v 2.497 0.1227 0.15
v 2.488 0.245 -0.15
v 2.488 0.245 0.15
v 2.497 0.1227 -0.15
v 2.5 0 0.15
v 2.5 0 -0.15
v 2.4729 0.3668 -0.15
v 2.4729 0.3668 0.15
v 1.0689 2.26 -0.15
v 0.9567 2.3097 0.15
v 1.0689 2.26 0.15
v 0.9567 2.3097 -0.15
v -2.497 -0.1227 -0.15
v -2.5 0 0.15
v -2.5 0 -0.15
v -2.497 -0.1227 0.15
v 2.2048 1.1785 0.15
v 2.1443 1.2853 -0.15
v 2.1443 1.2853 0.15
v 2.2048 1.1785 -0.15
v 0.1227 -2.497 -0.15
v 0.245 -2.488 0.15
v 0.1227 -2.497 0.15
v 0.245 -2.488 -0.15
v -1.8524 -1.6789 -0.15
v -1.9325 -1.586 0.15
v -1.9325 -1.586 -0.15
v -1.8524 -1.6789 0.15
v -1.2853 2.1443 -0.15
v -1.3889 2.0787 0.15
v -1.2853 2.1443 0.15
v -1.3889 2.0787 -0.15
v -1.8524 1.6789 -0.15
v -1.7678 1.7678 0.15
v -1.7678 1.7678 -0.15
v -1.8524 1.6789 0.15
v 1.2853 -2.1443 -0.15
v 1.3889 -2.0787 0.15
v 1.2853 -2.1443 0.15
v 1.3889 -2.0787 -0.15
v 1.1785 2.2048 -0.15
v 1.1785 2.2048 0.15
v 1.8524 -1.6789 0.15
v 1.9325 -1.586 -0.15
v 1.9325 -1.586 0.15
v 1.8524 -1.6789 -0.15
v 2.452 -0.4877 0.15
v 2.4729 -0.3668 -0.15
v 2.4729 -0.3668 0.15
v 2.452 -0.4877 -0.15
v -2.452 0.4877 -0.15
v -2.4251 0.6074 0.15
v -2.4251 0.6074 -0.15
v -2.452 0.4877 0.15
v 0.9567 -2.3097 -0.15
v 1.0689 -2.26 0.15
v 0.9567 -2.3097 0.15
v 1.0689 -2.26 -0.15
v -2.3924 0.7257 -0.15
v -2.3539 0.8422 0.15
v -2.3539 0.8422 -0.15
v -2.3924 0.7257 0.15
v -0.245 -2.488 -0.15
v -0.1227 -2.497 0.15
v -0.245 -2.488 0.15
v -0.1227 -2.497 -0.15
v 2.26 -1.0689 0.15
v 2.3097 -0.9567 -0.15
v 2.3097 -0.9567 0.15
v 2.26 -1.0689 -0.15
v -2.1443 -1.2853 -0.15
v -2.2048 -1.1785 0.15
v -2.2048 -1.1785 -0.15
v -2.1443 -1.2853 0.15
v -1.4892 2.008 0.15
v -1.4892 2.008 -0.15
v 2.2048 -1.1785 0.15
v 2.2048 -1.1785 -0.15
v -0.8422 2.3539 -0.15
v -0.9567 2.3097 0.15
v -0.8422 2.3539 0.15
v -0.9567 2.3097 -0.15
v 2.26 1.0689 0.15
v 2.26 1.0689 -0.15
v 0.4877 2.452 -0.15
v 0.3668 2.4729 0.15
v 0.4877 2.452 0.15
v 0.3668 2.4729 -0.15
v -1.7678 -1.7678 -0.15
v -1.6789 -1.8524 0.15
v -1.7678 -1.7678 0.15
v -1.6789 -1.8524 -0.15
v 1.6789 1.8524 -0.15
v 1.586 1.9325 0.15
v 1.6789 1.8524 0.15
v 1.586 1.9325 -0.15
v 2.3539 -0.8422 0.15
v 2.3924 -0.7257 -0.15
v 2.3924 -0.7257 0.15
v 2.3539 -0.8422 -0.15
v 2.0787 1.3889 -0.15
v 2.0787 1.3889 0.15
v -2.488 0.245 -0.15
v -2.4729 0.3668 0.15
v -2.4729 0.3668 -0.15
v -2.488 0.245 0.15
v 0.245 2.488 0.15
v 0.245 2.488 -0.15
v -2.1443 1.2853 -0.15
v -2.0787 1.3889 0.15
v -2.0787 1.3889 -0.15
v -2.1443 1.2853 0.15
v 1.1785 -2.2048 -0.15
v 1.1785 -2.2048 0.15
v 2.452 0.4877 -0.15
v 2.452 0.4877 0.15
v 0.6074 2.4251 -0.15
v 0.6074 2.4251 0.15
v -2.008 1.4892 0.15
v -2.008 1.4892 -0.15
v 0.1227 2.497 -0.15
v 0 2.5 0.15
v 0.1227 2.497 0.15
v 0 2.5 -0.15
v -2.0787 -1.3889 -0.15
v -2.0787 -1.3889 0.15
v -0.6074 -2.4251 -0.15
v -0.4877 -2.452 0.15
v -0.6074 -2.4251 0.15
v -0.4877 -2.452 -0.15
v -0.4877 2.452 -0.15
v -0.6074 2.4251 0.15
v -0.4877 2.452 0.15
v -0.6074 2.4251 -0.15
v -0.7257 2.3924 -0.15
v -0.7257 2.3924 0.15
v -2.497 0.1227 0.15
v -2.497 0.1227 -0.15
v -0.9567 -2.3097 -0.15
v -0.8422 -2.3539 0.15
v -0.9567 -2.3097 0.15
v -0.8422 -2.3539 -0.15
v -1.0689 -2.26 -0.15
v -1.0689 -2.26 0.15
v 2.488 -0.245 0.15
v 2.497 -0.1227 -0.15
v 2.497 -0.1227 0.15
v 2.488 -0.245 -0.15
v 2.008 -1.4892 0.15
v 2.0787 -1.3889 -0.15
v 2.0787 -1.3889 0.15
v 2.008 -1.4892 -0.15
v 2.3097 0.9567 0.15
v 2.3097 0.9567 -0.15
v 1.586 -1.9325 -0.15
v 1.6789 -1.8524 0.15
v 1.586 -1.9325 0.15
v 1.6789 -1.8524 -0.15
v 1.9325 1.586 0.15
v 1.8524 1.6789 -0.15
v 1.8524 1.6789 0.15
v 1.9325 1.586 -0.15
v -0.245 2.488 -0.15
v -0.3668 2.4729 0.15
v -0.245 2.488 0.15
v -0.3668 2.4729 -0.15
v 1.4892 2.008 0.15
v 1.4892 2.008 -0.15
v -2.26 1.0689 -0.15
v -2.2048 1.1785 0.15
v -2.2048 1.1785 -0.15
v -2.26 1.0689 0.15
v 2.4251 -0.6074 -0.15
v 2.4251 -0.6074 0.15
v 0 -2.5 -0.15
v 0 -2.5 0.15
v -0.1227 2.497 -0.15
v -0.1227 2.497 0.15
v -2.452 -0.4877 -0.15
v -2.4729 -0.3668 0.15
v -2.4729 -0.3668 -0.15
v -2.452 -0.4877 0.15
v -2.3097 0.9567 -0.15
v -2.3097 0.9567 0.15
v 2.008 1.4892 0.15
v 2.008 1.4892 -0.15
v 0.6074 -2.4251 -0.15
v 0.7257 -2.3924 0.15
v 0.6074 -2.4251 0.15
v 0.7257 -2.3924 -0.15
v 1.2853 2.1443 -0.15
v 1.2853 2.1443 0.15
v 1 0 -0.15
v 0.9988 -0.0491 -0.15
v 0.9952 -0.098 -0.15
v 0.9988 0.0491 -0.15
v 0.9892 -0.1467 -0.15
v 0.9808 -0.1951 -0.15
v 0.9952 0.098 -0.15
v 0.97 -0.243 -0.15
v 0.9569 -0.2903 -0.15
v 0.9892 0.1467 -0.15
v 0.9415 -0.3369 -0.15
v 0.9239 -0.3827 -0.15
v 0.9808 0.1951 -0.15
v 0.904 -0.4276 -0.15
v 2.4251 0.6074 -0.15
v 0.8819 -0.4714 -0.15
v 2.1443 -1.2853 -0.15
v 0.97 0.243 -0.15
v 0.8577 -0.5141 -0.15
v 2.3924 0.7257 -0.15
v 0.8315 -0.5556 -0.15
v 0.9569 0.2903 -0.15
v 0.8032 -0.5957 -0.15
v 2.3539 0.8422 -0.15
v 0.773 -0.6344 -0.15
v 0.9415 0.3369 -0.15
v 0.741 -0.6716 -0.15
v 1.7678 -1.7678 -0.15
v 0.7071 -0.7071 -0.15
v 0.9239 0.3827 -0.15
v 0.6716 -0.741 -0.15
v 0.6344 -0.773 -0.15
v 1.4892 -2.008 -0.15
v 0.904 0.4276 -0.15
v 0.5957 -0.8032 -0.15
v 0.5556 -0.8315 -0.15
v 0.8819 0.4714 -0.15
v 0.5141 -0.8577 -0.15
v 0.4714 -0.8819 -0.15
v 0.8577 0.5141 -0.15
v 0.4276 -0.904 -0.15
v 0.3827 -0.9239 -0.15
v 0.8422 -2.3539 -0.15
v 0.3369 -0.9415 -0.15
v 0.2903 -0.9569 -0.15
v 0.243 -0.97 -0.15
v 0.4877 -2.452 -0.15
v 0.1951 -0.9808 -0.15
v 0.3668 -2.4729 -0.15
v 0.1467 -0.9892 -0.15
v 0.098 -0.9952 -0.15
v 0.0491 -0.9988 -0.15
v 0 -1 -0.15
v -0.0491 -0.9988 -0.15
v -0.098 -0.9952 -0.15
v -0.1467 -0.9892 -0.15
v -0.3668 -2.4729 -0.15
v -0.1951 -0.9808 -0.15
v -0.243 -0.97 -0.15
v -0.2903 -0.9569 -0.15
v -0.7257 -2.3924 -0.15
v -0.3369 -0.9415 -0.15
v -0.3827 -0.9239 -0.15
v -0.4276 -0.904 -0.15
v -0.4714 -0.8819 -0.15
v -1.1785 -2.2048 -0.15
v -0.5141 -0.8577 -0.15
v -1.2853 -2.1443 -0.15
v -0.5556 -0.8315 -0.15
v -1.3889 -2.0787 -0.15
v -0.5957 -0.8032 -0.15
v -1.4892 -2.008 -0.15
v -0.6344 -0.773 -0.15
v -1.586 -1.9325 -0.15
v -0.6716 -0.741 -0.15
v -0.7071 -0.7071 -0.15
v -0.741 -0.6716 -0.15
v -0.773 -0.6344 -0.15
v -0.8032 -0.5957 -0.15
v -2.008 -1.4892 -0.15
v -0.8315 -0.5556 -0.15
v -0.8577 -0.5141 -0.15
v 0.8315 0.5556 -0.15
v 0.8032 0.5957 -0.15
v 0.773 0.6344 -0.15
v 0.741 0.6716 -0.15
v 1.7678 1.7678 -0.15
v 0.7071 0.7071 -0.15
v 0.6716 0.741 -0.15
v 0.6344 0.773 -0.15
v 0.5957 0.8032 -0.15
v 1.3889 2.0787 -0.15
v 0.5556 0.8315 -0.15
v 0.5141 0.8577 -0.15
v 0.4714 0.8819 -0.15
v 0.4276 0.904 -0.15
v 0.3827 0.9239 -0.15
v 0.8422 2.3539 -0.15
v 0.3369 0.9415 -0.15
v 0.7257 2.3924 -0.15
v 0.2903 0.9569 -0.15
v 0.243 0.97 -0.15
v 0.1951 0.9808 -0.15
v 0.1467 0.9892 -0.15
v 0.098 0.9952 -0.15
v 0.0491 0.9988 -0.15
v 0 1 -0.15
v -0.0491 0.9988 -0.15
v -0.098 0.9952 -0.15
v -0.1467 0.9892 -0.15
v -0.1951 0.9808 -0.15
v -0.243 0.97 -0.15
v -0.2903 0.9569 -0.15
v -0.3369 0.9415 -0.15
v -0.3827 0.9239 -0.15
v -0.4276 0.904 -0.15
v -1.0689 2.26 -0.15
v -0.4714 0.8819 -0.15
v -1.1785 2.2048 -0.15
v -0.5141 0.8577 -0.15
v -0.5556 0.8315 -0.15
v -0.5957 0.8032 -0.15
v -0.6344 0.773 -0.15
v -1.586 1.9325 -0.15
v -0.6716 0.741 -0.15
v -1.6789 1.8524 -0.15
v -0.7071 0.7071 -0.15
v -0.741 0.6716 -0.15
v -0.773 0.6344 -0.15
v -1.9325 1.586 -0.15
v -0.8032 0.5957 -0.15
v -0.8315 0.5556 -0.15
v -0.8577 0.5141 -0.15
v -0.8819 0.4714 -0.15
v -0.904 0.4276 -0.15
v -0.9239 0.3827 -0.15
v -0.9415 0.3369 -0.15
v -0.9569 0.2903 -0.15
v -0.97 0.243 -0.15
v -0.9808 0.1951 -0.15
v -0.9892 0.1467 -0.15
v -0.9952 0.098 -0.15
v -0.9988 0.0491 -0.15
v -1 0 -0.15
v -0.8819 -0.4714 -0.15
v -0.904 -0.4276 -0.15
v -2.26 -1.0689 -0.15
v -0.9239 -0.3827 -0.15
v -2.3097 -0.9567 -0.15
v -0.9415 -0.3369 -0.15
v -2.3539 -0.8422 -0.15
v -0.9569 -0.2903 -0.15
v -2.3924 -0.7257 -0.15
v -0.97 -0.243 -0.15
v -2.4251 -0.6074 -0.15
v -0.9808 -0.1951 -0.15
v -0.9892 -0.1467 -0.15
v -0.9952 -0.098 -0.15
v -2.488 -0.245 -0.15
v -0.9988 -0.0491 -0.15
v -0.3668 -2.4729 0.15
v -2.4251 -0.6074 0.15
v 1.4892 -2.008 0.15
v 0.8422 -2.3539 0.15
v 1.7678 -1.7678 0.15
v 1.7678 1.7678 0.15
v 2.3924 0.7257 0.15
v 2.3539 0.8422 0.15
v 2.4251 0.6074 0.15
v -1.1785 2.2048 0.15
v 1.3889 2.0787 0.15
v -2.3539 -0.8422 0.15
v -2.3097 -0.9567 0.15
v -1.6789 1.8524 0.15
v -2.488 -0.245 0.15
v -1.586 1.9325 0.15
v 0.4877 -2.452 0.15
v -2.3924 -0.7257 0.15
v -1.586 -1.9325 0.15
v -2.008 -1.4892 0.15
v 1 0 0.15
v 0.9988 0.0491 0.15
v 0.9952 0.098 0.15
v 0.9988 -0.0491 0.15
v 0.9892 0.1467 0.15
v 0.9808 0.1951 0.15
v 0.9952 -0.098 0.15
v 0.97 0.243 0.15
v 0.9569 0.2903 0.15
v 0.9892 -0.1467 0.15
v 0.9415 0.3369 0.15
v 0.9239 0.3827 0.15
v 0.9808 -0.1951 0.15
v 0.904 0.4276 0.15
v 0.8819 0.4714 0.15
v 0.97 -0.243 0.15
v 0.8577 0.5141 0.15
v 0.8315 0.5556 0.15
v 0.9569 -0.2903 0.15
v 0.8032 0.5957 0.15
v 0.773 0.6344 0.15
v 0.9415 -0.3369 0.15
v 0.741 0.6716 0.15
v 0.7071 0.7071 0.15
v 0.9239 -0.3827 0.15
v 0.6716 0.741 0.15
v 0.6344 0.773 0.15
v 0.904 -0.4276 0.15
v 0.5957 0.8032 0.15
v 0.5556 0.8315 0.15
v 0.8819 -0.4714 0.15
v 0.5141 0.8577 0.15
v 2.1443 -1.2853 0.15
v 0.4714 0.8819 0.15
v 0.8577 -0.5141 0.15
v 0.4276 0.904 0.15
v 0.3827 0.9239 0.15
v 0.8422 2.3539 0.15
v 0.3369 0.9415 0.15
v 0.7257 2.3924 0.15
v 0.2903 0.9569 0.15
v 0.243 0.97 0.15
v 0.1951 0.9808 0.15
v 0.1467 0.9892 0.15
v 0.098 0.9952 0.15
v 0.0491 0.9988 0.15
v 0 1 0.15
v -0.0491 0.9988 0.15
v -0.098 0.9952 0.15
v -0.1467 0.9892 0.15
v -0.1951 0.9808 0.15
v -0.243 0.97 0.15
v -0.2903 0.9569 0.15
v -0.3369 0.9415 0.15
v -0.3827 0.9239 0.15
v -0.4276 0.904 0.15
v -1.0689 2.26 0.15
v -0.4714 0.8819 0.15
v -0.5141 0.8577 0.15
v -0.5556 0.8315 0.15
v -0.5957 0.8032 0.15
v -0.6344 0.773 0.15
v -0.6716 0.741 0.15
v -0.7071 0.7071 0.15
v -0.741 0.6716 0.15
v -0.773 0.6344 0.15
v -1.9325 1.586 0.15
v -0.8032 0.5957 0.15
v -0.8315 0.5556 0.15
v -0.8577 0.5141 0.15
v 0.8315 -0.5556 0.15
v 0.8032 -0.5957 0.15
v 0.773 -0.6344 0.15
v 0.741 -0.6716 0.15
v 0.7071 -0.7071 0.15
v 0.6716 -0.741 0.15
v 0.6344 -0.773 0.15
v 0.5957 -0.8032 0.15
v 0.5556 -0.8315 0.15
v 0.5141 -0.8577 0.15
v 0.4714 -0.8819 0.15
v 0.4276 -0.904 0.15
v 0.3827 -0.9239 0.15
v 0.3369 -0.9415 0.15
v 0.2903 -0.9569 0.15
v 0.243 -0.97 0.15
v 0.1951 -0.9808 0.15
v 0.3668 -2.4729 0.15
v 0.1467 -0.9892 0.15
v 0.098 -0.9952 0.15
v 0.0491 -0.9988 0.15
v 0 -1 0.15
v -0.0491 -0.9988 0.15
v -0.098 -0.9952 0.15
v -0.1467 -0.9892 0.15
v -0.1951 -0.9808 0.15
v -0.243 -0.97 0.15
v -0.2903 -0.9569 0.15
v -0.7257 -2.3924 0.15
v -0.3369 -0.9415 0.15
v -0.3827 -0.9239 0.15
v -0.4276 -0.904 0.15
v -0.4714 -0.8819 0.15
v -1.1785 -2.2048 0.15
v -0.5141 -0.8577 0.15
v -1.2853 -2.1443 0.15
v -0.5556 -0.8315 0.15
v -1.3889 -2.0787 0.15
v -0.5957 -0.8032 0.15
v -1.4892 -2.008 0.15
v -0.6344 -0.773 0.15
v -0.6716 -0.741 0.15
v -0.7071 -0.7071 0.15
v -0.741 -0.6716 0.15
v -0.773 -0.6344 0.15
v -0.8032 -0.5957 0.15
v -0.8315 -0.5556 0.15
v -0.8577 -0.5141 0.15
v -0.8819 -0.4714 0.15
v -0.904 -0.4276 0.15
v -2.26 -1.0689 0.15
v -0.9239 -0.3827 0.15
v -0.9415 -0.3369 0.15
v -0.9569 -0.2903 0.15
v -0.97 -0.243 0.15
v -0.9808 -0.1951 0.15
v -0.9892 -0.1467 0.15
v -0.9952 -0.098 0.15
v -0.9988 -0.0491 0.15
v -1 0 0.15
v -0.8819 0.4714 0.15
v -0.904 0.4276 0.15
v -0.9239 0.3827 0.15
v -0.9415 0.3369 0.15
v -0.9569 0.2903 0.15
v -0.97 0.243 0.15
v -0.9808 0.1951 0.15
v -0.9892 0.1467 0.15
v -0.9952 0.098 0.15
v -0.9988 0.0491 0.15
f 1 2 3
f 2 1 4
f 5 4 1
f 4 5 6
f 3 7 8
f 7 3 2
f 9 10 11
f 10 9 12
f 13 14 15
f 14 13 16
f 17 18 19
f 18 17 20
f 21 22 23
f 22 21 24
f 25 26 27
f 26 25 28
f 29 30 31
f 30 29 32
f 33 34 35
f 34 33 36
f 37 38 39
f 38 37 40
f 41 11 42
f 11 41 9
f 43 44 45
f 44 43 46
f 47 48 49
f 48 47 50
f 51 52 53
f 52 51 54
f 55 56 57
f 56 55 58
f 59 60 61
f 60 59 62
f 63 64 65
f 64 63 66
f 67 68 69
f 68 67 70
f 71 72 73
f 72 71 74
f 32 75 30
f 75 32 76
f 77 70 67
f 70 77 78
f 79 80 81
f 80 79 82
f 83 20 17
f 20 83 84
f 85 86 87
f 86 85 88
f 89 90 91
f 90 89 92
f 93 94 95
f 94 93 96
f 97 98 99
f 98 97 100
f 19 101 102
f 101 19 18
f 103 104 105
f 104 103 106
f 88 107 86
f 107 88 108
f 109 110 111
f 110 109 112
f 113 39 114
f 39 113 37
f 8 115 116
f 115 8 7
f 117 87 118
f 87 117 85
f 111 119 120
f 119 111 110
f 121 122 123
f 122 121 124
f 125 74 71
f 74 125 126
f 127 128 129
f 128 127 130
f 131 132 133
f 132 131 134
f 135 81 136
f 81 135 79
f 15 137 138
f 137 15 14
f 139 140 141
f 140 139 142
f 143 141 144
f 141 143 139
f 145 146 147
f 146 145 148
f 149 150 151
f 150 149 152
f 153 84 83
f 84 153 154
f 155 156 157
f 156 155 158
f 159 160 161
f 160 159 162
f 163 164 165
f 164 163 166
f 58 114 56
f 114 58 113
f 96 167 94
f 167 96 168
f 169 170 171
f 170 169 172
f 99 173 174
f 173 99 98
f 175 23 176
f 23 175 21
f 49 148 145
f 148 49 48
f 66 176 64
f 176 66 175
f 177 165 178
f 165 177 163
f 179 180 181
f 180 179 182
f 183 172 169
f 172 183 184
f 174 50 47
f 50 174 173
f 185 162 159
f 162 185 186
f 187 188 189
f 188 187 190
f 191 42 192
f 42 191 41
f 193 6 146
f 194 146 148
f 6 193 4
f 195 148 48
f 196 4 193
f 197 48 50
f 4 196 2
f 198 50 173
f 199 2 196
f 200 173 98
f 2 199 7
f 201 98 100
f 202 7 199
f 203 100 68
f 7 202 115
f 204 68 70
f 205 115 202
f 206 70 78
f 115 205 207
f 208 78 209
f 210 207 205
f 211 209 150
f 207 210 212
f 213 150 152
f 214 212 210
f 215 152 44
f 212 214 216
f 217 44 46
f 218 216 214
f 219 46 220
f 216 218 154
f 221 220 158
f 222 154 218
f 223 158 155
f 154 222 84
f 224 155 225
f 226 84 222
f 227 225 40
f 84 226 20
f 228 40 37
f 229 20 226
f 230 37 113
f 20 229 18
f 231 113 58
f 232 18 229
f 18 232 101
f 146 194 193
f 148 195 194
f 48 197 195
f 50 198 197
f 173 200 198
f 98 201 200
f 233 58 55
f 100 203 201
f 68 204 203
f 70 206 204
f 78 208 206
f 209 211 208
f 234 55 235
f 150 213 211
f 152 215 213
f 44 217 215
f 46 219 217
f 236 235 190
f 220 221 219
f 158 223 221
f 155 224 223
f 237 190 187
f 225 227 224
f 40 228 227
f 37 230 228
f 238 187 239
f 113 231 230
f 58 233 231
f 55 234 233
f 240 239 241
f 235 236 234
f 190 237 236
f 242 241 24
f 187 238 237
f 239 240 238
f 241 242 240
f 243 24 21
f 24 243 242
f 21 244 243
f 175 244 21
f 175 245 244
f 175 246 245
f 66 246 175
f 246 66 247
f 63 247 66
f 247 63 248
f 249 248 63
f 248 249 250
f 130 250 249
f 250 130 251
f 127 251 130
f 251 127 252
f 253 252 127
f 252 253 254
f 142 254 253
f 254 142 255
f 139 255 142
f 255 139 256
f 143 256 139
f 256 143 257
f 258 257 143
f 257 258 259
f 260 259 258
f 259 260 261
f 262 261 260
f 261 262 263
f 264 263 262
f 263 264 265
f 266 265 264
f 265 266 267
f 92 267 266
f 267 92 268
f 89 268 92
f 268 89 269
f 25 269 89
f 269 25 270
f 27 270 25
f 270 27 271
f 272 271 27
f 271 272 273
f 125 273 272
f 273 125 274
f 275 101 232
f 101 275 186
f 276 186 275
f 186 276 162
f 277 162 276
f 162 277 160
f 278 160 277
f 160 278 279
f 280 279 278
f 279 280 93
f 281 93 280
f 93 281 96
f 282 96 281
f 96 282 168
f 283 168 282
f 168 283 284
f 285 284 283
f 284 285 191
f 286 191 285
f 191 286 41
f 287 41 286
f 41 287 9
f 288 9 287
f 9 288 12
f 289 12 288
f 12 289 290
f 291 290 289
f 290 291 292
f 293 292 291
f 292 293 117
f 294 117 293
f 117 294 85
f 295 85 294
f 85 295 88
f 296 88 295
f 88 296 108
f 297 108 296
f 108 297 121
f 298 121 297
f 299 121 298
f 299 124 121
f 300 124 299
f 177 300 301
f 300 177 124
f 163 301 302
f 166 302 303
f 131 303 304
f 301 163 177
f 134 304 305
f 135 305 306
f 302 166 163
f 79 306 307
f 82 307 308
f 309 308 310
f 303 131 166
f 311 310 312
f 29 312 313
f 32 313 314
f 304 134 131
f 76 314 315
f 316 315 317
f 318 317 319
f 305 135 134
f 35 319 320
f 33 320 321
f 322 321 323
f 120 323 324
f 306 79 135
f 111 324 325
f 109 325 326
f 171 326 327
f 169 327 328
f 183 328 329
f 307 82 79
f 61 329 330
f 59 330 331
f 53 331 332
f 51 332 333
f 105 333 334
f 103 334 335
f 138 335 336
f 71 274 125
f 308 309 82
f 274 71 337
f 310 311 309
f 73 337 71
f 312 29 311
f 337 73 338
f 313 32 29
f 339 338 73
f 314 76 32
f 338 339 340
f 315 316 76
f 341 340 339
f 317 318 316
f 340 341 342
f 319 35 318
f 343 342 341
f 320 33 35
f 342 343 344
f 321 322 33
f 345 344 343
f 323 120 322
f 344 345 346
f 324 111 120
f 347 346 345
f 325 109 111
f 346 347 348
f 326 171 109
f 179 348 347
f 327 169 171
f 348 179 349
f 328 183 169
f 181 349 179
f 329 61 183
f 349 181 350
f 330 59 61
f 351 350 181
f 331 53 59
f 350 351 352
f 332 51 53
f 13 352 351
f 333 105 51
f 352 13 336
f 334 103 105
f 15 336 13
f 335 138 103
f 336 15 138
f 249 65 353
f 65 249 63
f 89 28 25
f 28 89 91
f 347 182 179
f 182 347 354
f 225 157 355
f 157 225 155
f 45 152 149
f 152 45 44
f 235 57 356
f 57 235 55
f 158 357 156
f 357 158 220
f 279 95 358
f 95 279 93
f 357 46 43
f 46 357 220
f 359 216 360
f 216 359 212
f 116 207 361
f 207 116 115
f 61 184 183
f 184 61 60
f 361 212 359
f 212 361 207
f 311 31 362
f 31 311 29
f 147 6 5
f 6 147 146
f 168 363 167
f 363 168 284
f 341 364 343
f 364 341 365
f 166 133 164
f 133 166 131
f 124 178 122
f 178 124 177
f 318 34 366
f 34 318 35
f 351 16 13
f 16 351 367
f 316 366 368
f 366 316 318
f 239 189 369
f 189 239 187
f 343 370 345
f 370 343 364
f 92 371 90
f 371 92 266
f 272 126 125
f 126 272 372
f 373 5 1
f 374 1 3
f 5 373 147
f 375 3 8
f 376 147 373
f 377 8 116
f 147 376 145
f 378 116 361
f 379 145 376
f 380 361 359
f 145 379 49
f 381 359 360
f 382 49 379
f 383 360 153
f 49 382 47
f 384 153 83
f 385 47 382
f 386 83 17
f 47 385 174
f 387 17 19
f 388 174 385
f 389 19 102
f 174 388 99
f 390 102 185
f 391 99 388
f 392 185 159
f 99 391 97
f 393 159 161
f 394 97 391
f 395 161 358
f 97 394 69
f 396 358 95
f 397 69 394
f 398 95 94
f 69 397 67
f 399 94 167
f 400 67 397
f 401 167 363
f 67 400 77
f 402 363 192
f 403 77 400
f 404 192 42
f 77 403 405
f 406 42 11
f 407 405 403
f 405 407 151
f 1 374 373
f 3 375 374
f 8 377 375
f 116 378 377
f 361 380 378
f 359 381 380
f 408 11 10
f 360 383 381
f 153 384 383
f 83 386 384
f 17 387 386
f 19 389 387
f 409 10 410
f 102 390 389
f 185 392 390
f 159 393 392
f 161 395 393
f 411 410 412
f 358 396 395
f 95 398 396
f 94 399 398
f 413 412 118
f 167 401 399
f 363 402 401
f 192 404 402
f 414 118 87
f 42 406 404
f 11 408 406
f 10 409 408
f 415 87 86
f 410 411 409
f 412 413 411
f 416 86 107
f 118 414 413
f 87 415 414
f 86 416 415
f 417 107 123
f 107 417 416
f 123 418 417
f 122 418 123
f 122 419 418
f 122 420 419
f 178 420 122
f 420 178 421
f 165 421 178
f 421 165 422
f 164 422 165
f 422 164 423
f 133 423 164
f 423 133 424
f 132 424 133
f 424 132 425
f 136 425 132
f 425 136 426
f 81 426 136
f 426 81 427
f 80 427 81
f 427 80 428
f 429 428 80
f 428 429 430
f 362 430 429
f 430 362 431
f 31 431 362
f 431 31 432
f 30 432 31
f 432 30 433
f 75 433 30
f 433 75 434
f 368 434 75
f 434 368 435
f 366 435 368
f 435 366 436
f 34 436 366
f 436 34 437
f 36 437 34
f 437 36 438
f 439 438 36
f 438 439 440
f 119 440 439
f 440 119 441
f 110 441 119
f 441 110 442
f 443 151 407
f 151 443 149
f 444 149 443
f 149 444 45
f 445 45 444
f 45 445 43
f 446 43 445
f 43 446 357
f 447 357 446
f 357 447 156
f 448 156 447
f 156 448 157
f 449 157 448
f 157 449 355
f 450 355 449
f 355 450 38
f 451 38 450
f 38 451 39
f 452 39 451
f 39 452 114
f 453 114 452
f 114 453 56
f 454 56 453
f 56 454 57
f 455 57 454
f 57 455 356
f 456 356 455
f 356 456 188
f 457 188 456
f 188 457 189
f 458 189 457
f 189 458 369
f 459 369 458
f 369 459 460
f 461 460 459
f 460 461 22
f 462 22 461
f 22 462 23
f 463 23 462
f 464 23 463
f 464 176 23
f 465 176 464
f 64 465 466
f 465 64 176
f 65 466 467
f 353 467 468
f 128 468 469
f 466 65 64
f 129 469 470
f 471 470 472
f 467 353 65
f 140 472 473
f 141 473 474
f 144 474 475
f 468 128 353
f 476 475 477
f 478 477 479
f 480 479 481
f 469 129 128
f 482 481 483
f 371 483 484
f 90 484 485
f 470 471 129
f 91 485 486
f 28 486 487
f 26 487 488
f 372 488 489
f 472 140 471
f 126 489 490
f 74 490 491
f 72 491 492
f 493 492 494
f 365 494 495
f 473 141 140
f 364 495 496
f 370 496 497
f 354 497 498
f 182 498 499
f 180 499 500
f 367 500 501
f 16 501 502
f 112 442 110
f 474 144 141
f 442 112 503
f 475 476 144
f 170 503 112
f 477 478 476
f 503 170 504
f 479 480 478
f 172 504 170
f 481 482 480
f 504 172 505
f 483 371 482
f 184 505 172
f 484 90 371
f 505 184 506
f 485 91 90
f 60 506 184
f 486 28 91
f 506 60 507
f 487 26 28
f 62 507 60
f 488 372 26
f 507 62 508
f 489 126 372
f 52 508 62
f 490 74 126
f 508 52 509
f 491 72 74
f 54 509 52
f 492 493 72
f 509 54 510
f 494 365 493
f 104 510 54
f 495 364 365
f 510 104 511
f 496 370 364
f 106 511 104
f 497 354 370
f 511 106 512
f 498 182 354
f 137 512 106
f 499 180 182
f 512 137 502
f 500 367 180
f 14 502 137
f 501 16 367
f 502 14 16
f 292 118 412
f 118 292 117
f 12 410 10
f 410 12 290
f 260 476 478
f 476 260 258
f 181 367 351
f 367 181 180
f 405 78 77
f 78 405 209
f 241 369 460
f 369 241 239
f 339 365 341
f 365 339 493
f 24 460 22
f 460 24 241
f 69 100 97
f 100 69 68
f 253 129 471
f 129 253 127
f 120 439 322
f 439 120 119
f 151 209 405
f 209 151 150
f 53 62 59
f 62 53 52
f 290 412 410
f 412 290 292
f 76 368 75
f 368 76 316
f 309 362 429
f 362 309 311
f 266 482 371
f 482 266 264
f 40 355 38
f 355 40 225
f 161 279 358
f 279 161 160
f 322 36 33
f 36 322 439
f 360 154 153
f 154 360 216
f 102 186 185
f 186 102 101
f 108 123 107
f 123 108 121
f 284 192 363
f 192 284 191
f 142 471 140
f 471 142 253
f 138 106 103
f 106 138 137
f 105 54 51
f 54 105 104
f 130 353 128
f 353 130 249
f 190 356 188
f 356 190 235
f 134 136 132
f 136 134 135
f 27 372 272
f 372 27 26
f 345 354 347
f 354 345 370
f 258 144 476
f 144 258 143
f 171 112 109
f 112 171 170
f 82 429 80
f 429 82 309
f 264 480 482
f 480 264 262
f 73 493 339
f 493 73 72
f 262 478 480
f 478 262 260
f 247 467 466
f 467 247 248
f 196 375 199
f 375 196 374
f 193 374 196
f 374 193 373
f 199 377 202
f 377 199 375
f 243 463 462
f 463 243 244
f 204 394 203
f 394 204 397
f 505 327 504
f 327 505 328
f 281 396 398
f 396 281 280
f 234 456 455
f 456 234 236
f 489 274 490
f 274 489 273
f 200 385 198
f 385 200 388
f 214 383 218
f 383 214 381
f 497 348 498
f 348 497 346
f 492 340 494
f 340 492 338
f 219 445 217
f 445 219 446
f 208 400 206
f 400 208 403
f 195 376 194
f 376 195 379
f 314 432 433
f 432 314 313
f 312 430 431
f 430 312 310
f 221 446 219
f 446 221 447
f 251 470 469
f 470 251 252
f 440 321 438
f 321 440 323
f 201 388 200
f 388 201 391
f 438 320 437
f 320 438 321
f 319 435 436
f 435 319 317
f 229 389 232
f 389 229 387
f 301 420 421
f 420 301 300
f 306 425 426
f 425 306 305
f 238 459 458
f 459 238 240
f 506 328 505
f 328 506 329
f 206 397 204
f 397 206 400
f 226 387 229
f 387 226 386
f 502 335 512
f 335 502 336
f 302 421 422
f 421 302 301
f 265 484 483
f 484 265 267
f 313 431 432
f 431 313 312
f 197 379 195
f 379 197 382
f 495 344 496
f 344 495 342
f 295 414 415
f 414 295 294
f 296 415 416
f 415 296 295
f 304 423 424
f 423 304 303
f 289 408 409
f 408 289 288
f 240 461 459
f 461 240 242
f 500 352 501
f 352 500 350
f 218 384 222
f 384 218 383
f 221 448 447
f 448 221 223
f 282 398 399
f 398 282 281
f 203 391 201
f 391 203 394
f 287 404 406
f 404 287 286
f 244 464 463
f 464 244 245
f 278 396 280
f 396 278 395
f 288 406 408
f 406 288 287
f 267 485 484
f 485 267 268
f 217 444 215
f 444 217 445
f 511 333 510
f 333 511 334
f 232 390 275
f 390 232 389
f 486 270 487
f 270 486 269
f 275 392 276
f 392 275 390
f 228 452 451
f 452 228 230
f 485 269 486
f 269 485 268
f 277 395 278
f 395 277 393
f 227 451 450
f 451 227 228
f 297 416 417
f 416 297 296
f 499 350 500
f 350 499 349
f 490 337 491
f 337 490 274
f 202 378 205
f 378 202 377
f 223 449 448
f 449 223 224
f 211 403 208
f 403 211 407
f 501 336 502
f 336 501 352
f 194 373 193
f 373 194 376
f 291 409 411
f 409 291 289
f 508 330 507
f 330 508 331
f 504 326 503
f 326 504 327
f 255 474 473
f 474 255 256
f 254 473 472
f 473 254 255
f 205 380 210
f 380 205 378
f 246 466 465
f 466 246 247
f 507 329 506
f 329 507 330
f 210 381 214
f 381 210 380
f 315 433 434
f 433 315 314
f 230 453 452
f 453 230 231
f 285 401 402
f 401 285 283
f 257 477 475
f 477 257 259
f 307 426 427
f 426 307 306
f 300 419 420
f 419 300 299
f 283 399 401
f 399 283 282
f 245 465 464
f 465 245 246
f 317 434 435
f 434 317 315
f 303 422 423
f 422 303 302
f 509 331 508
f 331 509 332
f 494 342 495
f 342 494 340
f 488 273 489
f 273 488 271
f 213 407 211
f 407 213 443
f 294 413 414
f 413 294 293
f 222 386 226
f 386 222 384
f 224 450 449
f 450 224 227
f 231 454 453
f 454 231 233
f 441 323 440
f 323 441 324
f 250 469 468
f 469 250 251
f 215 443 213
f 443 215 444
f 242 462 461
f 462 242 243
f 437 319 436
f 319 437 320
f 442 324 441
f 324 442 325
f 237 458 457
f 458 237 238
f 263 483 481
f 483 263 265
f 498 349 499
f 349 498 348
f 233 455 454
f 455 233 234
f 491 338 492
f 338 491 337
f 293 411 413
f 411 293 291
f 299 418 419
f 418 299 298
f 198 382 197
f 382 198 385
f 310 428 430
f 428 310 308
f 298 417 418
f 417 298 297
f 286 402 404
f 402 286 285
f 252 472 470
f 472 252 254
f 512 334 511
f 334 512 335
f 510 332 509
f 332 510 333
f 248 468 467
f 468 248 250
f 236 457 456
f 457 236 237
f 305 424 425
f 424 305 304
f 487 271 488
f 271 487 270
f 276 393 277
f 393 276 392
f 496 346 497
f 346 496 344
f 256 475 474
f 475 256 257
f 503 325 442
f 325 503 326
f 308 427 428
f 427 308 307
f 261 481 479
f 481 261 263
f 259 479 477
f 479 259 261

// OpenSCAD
// Flat washer parameters (mm)
inner_diameter_mm = 2.0;  //[1.0:4.0:0.1]
outer_diameter_mm = 5.0;  //[2.5:10.0:0.1]
thickness_mm      = 0.3;  //[0.15:0.6:0.05]

// Smoothness for circular appearance
$fn = 128;

difference() {
    cylinder(d = outer_diameter_mm, h = thickness_mm, center = true);
    cylinder(d = inner_diameter_mm, h = thickness_mm + 0.2, center = true);
}
